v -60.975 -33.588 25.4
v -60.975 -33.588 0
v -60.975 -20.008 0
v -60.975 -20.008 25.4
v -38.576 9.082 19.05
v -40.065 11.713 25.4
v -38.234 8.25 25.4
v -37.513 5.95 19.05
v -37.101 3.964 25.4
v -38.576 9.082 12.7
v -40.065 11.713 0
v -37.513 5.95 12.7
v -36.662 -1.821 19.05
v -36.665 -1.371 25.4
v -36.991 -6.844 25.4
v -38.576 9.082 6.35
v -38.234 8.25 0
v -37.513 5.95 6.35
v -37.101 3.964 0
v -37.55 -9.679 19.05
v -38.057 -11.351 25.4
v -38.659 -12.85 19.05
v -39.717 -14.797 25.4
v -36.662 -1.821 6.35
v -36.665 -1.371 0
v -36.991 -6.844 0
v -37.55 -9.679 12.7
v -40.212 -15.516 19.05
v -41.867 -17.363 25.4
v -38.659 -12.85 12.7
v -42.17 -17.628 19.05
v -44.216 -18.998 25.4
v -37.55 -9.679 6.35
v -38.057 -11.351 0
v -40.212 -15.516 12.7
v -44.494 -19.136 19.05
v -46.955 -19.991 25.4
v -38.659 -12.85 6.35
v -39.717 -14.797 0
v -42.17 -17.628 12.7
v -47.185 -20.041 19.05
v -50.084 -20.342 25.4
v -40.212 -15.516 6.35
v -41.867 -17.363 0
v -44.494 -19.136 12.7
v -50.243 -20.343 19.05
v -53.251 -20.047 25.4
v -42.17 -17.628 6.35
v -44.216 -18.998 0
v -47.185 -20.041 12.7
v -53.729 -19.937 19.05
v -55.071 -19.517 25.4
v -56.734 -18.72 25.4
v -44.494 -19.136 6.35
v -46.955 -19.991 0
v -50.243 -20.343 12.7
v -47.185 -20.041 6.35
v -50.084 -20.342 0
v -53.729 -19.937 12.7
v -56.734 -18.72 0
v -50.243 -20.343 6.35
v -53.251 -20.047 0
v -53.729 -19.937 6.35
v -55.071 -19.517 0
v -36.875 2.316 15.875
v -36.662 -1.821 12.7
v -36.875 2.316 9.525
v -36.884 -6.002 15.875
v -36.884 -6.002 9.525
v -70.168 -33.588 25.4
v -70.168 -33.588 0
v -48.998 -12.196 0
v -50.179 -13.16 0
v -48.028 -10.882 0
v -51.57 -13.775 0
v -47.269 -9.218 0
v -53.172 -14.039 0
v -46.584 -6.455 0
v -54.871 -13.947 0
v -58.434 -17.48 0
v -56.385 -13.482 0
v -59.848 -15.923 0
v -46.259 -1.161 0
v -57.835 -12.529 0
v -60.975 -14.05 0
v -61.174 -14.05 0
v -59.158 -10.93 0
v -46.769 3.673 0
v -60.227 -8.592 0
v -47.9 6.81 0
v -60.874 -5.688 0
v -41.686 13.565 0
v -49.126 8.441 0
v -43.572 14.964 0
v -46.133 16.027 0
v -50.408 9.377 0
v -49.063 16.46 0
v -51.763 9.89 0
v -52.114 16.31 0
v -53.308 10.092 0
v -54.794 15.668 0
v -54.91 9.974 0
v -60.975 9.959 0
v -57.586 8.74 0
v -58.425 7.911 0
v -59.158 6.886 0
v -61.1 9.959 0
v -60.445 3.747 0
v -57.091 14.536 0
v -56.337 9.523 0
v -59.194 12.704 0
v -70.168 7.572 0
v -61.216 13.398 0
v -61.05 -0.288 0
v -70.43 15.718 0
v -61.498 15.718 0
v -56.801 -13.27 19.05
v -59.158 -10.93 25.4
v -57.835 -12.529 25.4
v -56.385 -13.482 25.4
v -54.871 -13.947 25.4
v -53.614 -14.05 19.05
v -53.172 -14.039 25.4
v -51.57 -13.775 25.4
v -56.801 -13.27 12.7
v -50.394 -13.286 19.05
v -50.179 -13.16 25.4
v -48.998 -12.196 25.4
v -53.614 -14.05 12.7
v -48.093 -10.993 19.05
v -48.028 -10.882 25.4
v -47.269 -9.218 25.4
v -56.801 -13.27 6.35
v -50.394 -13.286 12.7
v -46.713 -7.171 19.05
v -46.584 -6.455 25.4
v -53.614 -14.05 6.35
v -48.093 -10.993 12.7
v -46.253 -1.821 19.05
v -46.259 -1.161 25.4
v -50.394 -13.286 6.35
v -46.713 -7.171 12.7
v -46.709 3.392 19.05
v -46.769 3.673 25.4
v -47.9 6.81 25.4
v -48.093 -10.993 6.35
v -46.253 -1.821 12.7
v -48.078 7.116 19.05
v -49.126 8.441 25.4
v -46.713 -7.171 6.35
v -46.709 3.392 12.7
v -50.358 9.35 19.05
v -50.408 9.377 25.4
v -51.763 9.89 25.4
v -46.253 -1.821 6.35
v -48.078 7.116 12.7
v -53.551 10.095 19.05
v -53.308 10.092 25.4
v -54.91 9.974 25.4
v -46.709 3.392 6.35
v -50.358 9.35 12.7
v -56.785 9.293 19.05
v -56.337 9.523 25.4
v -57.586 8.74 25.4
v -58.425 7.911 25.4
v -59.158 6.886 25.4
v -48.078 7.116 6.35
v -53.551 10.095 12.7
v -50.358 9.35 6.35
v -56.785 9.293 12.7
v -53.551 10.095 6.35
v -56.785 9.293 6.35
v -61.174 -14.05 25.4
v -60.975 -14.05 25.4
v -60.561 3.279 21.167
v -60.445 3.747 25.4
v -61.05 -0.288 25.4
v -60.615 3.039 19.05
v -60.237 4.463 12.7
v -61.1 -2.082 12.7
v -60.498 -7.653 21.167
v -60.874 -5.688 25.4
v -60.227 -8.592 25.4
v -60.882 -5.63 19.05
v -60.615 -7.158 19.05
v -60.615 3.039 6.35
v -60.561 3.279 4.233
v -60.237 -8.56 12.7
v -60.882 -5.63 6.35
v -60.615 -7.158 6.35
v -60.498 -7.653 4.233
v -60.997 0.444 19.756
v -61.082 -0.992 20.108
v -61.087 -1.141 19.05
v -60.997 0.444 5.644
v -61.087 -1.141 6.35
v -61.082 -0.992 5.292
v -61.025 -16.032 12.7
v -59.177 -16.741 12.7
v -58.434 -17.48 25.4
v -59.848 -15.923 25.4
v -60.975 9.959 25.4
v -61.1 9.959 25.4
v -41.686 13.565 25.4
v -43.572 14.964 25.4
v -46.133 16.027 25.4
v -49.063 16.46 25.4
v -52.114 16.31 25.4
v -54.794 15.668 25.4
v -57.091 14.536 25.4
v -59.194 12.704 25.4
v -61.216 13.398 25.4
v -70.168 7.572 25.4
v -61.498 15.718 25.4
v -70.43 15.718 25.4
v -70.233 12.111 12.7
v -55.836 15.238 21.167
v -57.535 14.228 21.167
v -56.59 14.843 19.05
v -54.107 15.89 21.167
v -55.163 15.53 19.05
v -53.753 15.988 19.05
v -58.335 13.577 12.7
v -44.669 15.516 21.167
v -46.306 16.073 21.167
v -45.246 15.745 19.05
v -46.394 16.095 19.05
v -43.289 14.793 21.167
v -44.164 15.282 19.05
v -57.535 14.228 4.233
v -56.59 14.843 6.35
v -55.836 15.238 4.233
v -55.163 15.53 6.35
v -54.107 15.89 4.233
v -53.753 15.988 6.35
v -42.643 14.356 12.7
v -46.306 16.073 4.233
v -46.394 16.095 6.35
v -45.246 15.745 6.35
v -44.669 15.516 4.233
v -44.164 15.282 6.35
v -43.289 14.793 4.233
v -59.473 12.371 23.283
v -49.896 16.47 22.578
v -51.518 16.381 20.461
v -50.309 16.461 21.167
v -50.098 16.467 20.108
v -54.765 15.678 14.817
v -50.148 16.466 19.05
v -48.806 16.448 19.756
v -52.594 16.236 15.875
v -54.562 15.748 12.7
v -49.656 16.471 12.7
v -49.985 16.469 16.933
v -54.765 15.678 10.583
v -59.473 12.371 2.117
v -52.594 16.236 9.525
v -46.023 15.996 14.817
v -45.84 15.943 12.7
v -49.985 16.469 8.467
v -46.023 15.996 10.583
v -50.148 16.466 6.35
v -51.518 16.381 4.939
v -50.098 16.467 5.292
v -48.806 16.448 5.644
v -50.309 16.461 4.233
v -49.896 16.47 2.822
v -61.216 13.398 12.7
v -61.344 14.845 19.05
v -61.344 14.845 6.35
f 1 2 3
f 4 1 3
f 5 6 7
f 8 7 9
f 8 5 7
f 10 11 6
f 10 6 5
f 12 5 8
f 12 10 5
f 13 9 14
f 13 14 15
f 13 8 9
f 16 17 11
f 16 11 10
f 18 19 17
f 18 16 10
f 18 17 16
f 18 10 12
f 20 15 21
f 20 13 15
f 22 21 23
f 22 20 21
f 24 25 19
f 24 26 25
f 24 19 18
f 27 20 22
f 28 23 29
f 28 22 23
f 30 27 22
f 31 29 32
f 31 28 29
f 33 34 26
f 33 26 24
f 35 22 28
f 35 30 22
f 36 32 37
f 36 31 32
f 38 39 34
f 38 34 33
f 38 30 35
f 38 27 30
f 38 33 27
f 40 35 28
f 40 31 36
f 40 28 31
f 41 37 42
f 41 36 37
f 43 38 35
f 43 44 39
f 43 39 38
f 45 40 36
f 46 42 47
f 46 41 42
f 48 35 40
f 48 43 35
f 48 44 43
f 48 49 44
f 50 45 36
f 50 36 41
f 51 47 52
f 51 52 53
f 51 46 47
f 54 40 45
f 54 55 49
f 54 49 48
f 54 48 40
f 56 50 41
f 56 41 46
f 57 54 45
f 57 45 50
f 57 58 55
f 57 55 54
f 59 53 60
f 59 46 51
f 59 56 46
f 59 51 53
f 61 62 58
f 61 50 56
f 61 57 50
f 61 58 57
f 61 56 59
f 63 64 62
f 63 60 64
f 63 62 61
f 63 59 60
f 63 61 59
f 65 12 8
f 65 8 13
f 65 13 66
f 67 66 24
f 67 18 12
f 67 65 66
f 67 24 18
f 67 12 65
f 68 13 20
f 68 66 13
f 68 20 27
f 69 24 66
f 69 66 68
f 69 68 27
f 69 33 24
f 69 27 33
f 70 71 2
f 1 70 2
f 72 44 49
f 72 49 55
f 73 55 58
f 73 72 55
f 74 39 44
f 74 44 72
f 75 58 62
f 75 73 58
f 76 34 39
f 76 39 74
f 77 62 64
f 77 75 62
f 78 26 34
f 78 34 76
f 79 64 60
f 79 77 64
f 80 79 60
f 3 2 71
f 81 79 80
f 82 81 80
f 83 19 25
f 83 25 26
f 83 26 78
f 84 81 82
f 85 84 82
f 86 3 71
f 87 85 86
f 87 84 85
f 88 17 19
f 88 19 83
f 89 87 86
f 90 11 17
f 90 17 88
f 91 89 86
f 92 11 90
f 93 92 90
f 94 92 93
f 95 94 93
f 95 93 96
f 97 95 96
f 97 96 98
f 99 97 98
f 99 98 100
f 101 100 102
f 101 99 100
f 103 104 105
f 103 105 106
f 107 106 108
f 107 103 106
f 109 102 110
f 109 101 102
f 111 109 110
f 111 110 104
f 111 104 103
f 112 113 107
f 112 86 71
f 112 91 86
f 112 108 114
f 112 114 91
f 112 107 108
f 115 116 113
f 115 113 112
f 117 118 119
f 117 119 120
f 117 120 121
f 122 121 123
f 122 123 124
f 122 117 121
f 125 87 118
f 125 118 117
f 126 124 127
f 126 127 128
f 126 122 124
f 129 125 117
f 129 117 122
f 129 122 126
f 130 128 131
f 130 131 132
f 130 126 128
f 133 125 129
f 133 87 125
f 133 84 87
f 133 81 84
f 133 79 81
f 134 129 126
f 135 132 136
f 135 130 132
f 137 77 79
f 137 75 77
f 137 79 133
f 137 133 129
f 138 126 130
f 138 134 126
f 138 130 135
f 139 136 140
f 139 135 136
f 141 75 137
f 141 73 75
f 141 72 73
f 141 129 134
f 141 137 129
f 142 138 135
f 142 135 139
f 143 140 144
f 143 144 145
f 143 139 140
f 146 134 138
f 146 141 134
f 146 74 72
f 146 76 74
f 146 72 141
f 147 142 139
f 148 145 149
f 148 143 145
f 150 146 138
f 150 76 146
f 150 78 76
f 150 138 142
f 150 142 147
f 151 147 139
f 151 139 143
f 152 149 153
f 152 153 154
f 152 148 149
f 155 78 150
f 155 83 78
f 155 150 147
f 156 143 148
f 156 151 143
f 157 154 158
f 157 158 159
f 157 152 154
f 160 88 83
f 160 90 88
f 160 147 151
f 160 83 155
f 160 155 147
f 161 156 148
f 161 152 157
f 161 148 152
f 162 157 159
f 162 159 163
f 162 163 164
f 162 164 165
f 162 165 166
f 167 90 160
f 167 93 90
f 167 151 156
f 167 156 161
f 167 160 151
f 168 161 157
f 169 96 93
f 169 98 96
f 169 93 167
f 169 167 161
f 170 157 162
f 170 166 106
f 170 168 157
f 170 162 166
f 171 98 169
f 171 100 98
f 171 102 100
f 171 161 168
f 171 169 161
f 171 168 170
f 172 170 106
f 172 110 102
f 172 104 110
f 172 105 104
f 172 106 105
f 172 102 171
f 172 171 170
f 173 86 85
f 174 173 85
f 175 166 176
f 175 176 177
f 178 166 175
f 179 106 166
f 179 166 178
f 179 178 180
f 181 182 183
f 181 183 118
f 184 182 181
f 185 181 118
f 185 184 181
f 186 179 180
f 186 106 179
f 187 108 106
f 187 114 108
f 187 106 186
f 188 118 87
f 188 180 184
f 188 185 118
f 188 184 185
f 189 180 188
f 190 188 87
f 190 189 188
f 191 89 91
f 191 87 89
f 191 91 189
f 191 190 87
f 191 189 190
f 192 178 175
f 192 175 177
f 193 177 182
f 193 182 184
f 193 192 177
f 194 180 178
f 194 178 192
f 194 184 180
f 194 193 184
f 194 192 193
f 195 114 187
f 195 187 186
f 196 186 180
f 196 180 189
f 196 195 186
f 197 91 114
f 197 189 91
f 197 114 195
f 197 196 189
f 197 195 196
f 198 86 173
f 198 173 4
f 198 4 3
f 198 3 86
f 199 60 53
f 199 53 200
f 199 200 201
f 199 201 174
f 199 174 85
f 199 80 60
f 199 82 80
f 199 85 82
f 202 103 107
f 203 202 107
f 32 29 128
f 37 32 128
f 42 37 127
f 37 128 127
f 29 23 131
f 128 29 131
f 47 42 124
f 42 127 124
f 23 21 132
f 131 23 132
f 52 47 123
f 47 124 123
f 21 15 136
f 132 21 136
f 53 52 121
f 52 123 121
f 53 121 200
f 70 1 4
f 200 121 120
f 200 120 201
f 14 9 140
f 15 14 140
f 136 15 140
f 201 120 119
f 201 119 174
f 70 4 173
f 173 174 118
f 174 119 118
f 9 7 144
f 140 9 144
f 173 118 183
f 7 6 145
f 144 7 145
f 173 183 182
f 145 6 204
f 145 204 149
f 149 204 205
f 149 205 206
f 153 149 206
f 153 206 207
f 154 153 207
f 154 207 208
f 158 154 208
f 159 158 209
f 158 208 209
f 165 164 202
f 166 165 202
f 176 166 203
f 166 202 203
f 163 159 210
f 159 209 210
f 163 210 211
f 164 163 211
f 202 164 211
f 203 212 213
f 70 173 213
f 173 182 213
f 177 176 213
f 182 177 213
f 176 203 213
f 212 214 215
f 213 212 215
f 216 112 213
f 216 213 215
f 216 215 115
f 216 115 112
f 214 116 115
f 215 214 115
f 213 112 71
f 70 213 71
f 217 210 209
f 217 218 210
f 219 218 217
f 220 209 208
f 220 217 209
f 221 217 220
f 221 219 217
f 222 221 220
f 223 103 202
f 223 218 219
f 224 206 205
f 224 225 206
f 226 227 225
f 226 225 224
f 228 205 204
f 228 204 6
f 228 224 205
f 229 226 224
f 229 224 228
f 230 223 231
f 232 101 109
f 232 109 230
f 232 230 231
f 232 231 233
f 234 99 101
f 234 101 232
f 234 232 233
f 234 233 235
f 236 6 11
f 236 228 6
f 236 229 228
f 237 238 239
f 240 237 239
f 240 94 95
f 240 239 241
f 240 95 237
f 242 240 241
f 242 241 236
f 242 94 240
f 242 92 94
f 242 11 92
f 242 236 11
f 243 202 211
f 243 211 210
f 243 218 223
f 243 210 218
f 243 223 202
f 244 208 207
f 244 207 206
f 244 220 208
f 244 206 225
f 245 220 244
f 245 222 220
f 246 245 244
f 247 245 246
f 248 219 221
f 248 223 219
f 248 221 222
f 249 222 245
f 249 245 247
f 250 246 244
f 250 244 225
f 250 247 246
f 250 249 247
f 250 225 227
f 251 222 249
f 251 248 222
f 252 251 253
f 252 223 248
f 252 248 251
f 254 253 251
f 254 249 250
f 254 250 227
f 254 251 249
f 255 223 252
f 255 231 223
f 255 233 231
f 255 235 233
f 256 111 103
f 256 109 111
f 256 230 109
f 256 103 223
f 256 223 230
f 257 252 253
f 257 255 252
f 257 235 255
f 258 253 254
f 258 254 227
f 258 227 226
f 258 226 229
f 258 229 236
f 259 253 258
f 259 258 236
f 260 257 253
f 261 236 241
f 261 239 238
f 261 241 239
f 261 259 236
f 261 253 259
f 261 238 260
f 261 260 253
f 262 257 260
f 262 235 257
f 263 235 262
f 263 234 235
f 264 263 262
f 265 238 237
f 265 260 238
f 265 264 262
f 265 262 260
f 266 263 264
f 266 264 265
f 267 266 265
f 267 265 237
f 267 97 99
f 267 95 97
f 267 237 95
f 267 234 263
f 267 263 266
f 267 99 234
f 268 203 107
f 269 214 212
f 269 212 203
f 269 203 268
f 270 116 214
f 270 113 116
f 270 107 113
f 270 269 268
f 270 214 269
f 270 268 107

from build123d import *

# Parameters (mm, degrees)
F1_DEPTH = 25.4


with BuildPart() as f1:
    # F0 (on Top) → F1 (new body)
    with BuildSketch(Plane.XY):
        with BuildLine():
            add(Edge.make_bspline(
                [(-36.6622424432, -1.8205549519), (-36.6622424432, -10.6891040171), (-40.2117561777, -15.5160238743)],
                knots=[0, 0, 0, 1, 1, 1], degree=2))
            add(Edge.make_bspline(
                [(-40.0651685898, 11.7126205696), (-36.6622424432, 6.9537592353), (-36.6622424432, -1.8205549519)],
                knots=[0, 0, 0, 1, 1, 1], degree=2))
            add(Edge.make_bspline(
                [(-49.6561850523, 16.4714819039), (-43.4680947365, 16.4714819039), (-40.0651685898, 11.7126205696)],
                knots=[0, 0, 0, 1, 1, 1], degree=2))
            add(Edge.make_bspline(
                [(-60.974840943, 9.9588047863), (-57.8650899721, 16.4714819039), (-49.6561850523, 16.4714819039)],
                knots=[0, 0, 0, 1, 1, 1], degree=2))
            Line((-60.974840943, 9.9588047863), (-61.1004874469, 9.9588047863))
            add(Edge.make_bspline(
                [(-61.2156634088, 13.3983778299), (-61.1004874469, 11.6655031306), (-61.1004874469, 9.9588047863)],
                knots=[0, 0, 0, 1, 1, 1], degree=2))
            add(Edge.make_bspline(
                [(-61.4983680425, 15.7176028806), (-61.3308393707, 15.1312525292), (-61.2156634088, 13.3983778299)],
                knots=[0, 0, 0, 1, 1, 1], degree=2))
            Line((-61.4983680425, 15.7176028806), (-70.4297403596, 15.7176028806))
            add(Edge.make_bspline(
                [(-70.1679768099, 7.5715212127), (-70.1679768099, 12.5764402837), (-70.4297403596, 15.7176028806)],
                knots=[0, 0, 0, 1, 1, 1], degree=2))
            Line((-70.1679768099, 7.5715212127), (-70.1679768099, -33.5881793483))
            Line((-70.1679768099, -33.5881793483), (-60.974840943, -33.5881793483))
            Line((-60.974840943, -33.5881793483), (-60.974840943, -20.0078863879))
            add(Edge.make_bspline(
                [(-61.1737812408, -14.0501479958), (-60.974840943, -15.0343789428), (-60.974840943, -20.0078863879)],
                knots=[0, 0, 0, 1, 1, 1], degree=2))
            Line((-61.1737812408, -14.0501479958), (-60.974840943, -14.0501479958))
            add(Edge.make_bspline(
                [(-56.7342714373, -18.7200097231), (-59.4984945225, -17.0970757147), (-60.974840943, -14.0501479958)],
                knots=[0, 0, 0, 1, 1, 1], degree=2))
            add(Edge.make_bspline(
                [(-50.2425354037, -20.3429437315), (-53.970048352, -20.3429437315), (-56.7342714373, -18.7200097231)],
                knots=[0, 0, 0, 1, 1, 1], degree=2))
            add(Edge.make_bspline(
                [(-40.2117561777, -15.5160238743), (-43.7612699122, -20.3429437315), (-50.2425354037, -20.3429437315)],
                knots=[0, 0, 0, 1, 1, 1], degree=2))
        make_face()
        with BuildLine():
            add(Edge.make_bspline(
                [(-46.2532589057, -1.8205549519), (-46.2532589057, 10.0949218322), (-53.5512266724, 10.0949218322)],
                knots=[0, 0, 0, 1, 1, 1], degree=2))
            add(Edge.make_bspline(
                [(-53.6140499244, -14.0501479958), (-46.2532589057, -14.0501479958), (-46.2532589057, -1.8205549519)],
                knots=[0, 0, 0, 1, 1, 1], degree=2))
            add(Edge.make_bspline(
                [(-59.1582019078, -10.9299264829), (-57.2159163688, -14.0501479958), (-53.6140499244, -14.0501479958)],
                knots=[0, 0, 0, 1, 1, 1], degree=2))
            add(Edge.make_bspline(
                [(-61.1004874469, -2.0823185017), (-61.1004874469, -7.80970497), (-59.1582019078, -10.9299264829)],
                knots=[0, 0, 0, 1, 1, 1], degree=2))
            add(Edge.make_bspline(
                [(-59.1582019078, 6.8857007124), (-61.1004874469, 3.6764795926), (-61.1004874469, -2.0823185017)],
                knots=[0, 0, 0, 1, 1, 1], degree=2))
            add(Edge.make_bspline(
                [(-53.5512266724, 10.0949218322), (-57.2159163688, 10.0949218322), (-59.1582019078, 6.8857007124)],
                knots=[0, 0, 0, 1, 1, 1], degree=2))
        make_face(mode=Mode.SUBTRACT)
    extrude(amount=F1_DEPTH)


solid = f1.part
